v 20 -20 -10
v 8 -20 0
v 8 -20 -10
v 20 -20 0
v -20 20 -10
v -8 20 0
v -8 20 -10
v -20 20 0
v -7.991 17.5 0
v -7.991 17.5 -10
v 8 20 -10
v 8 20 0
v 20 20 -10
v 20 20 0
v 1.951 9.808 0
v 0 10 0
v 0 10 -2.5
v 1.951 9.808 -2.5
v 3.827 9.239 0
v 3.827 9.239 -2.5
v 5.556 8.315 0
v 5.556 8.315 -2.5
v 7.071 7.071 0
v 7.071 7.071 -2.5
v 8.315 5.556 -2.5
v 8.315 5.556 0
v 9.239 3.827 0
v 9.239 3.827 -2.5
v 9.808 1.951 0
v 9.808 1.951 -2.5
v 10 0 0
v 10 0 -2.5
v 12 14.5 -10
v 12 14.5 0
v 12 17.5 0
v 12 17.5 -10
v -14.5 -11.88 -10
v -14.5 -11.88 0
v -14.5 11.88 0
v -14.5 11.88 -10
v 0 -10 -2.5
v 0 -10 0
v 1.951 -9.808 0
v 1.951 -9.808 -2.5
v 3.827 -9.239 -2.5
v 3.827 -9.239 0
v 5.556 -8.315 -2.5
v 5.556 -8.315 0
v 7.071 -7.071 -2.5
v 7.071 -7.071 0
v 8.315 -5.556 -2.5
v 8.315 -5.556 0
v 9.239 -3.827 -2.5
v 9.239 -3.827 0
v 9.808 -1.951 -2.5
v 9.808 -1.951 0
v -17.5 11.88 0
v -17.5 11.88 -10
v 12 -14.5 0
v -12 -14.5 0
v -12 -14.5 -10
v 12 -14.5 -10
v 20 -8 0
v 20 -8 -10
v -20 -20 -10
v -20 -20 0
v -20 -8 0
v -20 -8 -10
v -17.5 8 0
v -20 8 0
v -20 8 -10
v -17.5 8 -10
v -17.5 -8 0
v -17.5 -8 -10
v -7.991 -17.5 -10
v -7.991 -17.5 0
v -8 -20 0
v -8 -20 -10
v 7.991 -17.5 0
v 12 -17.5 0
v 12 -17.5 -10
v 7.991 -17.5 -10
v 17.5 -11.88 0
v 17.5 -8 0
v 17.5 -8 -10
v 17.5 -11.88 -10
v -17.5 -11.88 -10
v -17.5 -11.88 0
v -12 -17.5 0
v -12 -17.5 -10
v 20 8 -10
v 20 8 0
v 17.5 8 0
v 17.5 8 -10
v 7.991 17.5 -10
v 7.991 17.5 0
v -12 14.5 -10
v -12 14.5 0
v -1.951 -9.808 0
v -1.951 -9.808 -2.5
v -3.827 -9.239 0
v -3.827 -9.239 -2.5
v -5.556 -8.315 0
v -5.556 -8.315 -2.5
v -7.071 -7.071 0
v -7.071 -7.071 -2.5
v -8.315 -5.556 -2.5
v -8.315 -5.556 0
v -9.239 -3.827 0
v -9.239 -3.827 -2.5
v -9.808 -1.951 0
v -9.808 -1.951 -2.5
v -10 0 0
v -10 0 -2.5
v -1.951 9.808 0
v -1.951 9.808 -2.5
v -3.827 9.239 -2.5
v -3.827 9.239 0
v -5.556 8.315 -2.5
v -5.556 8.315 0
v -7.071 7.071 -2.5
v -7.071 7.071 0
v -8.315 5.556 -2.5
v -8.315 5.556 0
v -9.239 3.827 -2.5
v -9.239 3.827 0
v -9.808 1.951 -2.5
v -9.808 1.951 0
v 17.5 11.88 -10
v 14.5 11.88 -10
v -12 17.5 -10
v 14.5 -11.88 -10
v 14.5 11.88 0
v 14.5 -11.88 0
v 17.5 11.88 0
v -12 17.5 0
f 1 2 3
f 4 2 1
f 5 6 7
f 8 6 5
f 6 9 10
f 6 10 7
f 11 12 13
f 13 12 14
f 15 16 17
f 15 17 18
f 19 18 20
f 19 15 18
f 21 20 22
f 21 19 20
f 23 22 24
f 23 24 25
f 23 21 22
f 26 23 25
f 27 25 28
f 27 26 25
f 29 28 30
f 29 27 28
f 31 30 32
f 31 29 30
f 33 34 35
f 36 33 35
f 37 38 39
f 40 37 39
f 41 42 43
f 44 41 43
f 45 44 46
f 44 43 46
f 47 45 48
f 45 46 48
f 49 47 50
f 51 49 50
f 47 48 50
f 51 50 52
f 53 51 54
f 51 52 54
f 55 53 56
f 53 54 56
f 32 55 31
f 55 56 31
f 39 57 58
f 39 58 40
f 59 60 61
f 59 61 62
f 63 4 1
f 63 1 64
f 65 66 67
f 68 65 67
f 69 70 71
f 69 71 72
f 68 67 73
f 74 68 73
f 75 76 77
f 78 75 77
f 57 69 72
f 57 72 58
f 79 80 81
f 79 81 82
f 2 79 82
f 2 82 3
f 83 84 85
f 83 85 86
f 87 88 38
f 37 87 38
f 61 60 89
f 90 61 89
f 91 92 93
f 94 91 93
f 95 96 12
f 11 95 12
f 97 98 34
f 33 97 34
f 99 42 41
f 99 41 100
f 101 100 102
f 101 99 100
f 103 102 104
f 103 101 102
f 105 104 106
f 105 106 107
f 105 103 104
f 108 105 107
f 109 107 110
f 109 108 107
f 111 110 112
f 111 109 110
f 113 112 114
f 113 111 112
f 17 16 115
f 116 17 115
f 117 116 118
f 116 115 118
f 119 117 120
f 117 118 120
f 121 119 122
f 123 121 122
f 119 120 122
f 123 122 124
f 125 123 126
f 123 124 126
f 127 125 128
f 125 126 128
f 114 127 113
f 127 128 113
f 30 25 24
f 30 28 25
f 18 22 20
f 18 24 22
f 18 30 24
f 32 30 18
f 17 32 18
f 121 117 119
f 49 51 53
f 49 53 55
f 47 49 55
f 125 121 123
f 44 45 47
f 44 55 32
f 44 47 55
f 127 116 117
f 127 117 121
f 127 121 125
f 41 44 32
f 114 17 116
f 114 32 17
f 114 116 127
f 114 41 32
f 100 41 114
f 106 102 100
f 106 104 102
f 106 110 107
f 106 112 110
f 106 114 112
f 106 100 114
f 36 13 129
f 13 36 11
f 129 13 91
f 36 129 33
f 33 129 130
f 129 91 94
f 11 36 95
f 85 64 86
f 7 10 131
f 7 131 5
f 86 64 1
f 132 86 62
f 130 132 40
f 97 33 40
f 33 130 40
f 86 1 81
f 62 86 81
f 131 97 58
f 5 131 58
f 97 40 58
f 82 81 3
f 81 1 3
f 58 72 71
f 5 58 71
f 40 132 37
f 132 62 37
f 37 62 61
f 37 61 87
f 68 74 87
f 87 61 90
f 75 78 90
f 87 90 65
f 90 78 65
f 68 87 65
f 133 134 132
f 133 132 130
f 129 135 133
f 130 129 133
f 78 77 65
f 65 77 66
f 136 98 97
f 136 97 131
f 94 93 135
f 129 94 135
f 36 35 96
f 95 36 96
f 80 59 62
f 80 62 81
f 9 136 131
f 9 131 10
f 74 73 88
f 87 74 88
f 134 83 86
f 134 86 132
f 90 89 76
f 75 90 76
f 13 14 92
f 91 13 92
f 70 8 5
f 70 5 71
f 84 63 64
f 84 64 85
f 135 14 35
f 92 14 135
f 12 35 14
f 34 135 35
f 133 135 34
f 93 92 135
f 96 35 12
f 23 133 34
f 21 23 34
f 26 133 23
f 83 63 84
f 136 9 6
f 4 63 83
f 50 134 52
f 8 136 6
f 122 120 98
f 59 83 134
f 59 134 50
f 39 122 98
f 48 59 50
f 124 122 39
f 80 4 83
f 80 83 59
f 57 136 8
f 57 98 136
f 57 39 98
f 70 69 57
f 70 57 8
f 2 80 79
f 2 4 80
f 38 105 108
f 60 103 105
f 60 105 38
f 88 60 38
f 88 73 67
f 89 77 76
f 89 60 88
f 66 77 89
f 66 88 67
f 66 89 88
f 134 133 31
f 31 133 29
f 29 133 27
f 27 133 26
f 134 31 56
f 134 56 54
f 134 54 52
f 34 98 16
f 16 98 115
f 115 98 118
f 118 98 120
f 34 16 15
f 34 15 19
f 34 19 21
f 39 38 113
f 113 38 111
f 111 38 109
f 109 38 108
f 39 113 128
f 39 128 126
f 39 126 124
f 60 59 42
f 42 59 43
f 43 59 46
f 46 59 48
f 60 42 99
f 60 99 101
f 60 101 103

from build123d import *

# Parameters (mm, degrees)
F1_DEPTH = 10
F3_DEPTH = 2.5


with BuildPart() as f1:
    # F0 (on Top) → F1 (new body)
    with BuildSketch(Plane.XY):
        Polygon((-7.990857, 17.500017), (-8, 20), (-20, 20), (-20, 8), (-17.5, 8), (-17.5, 11.880315), (-14.5, 11.880315), (-14.5, 0), (0, 0), (0, 14.500017), (-12, 14.500017), (-12, 17.500017), align=None)
    extrude(amount=-F1_DEPTH)

    # F2 (on face) → F3 (cut)
    with BuildSketch(Plane.XY):
        with BuildLine():
            Line((0, 0), (0, 10))
            ThreePointArc((0, 10), (-7.071068, 7.071068), (-10, 0))
            Line((-10, 0), (0, 0))
        make_face()
    extrude(amount=-F3_DEPTH, mode=Mode.SUBTRACT)

    # F4: F1 across plane


with BuildPart() as f1_1:
    add(f1.part)
    add(f1.part.mirror(Plane.YZ))

    # F5: F1 across plane


with BuildPart() as f1_2:
    add(f1_1.part)
    add(f1_1.part.mirror(Plane.XZ))


solid = f1_2.part
